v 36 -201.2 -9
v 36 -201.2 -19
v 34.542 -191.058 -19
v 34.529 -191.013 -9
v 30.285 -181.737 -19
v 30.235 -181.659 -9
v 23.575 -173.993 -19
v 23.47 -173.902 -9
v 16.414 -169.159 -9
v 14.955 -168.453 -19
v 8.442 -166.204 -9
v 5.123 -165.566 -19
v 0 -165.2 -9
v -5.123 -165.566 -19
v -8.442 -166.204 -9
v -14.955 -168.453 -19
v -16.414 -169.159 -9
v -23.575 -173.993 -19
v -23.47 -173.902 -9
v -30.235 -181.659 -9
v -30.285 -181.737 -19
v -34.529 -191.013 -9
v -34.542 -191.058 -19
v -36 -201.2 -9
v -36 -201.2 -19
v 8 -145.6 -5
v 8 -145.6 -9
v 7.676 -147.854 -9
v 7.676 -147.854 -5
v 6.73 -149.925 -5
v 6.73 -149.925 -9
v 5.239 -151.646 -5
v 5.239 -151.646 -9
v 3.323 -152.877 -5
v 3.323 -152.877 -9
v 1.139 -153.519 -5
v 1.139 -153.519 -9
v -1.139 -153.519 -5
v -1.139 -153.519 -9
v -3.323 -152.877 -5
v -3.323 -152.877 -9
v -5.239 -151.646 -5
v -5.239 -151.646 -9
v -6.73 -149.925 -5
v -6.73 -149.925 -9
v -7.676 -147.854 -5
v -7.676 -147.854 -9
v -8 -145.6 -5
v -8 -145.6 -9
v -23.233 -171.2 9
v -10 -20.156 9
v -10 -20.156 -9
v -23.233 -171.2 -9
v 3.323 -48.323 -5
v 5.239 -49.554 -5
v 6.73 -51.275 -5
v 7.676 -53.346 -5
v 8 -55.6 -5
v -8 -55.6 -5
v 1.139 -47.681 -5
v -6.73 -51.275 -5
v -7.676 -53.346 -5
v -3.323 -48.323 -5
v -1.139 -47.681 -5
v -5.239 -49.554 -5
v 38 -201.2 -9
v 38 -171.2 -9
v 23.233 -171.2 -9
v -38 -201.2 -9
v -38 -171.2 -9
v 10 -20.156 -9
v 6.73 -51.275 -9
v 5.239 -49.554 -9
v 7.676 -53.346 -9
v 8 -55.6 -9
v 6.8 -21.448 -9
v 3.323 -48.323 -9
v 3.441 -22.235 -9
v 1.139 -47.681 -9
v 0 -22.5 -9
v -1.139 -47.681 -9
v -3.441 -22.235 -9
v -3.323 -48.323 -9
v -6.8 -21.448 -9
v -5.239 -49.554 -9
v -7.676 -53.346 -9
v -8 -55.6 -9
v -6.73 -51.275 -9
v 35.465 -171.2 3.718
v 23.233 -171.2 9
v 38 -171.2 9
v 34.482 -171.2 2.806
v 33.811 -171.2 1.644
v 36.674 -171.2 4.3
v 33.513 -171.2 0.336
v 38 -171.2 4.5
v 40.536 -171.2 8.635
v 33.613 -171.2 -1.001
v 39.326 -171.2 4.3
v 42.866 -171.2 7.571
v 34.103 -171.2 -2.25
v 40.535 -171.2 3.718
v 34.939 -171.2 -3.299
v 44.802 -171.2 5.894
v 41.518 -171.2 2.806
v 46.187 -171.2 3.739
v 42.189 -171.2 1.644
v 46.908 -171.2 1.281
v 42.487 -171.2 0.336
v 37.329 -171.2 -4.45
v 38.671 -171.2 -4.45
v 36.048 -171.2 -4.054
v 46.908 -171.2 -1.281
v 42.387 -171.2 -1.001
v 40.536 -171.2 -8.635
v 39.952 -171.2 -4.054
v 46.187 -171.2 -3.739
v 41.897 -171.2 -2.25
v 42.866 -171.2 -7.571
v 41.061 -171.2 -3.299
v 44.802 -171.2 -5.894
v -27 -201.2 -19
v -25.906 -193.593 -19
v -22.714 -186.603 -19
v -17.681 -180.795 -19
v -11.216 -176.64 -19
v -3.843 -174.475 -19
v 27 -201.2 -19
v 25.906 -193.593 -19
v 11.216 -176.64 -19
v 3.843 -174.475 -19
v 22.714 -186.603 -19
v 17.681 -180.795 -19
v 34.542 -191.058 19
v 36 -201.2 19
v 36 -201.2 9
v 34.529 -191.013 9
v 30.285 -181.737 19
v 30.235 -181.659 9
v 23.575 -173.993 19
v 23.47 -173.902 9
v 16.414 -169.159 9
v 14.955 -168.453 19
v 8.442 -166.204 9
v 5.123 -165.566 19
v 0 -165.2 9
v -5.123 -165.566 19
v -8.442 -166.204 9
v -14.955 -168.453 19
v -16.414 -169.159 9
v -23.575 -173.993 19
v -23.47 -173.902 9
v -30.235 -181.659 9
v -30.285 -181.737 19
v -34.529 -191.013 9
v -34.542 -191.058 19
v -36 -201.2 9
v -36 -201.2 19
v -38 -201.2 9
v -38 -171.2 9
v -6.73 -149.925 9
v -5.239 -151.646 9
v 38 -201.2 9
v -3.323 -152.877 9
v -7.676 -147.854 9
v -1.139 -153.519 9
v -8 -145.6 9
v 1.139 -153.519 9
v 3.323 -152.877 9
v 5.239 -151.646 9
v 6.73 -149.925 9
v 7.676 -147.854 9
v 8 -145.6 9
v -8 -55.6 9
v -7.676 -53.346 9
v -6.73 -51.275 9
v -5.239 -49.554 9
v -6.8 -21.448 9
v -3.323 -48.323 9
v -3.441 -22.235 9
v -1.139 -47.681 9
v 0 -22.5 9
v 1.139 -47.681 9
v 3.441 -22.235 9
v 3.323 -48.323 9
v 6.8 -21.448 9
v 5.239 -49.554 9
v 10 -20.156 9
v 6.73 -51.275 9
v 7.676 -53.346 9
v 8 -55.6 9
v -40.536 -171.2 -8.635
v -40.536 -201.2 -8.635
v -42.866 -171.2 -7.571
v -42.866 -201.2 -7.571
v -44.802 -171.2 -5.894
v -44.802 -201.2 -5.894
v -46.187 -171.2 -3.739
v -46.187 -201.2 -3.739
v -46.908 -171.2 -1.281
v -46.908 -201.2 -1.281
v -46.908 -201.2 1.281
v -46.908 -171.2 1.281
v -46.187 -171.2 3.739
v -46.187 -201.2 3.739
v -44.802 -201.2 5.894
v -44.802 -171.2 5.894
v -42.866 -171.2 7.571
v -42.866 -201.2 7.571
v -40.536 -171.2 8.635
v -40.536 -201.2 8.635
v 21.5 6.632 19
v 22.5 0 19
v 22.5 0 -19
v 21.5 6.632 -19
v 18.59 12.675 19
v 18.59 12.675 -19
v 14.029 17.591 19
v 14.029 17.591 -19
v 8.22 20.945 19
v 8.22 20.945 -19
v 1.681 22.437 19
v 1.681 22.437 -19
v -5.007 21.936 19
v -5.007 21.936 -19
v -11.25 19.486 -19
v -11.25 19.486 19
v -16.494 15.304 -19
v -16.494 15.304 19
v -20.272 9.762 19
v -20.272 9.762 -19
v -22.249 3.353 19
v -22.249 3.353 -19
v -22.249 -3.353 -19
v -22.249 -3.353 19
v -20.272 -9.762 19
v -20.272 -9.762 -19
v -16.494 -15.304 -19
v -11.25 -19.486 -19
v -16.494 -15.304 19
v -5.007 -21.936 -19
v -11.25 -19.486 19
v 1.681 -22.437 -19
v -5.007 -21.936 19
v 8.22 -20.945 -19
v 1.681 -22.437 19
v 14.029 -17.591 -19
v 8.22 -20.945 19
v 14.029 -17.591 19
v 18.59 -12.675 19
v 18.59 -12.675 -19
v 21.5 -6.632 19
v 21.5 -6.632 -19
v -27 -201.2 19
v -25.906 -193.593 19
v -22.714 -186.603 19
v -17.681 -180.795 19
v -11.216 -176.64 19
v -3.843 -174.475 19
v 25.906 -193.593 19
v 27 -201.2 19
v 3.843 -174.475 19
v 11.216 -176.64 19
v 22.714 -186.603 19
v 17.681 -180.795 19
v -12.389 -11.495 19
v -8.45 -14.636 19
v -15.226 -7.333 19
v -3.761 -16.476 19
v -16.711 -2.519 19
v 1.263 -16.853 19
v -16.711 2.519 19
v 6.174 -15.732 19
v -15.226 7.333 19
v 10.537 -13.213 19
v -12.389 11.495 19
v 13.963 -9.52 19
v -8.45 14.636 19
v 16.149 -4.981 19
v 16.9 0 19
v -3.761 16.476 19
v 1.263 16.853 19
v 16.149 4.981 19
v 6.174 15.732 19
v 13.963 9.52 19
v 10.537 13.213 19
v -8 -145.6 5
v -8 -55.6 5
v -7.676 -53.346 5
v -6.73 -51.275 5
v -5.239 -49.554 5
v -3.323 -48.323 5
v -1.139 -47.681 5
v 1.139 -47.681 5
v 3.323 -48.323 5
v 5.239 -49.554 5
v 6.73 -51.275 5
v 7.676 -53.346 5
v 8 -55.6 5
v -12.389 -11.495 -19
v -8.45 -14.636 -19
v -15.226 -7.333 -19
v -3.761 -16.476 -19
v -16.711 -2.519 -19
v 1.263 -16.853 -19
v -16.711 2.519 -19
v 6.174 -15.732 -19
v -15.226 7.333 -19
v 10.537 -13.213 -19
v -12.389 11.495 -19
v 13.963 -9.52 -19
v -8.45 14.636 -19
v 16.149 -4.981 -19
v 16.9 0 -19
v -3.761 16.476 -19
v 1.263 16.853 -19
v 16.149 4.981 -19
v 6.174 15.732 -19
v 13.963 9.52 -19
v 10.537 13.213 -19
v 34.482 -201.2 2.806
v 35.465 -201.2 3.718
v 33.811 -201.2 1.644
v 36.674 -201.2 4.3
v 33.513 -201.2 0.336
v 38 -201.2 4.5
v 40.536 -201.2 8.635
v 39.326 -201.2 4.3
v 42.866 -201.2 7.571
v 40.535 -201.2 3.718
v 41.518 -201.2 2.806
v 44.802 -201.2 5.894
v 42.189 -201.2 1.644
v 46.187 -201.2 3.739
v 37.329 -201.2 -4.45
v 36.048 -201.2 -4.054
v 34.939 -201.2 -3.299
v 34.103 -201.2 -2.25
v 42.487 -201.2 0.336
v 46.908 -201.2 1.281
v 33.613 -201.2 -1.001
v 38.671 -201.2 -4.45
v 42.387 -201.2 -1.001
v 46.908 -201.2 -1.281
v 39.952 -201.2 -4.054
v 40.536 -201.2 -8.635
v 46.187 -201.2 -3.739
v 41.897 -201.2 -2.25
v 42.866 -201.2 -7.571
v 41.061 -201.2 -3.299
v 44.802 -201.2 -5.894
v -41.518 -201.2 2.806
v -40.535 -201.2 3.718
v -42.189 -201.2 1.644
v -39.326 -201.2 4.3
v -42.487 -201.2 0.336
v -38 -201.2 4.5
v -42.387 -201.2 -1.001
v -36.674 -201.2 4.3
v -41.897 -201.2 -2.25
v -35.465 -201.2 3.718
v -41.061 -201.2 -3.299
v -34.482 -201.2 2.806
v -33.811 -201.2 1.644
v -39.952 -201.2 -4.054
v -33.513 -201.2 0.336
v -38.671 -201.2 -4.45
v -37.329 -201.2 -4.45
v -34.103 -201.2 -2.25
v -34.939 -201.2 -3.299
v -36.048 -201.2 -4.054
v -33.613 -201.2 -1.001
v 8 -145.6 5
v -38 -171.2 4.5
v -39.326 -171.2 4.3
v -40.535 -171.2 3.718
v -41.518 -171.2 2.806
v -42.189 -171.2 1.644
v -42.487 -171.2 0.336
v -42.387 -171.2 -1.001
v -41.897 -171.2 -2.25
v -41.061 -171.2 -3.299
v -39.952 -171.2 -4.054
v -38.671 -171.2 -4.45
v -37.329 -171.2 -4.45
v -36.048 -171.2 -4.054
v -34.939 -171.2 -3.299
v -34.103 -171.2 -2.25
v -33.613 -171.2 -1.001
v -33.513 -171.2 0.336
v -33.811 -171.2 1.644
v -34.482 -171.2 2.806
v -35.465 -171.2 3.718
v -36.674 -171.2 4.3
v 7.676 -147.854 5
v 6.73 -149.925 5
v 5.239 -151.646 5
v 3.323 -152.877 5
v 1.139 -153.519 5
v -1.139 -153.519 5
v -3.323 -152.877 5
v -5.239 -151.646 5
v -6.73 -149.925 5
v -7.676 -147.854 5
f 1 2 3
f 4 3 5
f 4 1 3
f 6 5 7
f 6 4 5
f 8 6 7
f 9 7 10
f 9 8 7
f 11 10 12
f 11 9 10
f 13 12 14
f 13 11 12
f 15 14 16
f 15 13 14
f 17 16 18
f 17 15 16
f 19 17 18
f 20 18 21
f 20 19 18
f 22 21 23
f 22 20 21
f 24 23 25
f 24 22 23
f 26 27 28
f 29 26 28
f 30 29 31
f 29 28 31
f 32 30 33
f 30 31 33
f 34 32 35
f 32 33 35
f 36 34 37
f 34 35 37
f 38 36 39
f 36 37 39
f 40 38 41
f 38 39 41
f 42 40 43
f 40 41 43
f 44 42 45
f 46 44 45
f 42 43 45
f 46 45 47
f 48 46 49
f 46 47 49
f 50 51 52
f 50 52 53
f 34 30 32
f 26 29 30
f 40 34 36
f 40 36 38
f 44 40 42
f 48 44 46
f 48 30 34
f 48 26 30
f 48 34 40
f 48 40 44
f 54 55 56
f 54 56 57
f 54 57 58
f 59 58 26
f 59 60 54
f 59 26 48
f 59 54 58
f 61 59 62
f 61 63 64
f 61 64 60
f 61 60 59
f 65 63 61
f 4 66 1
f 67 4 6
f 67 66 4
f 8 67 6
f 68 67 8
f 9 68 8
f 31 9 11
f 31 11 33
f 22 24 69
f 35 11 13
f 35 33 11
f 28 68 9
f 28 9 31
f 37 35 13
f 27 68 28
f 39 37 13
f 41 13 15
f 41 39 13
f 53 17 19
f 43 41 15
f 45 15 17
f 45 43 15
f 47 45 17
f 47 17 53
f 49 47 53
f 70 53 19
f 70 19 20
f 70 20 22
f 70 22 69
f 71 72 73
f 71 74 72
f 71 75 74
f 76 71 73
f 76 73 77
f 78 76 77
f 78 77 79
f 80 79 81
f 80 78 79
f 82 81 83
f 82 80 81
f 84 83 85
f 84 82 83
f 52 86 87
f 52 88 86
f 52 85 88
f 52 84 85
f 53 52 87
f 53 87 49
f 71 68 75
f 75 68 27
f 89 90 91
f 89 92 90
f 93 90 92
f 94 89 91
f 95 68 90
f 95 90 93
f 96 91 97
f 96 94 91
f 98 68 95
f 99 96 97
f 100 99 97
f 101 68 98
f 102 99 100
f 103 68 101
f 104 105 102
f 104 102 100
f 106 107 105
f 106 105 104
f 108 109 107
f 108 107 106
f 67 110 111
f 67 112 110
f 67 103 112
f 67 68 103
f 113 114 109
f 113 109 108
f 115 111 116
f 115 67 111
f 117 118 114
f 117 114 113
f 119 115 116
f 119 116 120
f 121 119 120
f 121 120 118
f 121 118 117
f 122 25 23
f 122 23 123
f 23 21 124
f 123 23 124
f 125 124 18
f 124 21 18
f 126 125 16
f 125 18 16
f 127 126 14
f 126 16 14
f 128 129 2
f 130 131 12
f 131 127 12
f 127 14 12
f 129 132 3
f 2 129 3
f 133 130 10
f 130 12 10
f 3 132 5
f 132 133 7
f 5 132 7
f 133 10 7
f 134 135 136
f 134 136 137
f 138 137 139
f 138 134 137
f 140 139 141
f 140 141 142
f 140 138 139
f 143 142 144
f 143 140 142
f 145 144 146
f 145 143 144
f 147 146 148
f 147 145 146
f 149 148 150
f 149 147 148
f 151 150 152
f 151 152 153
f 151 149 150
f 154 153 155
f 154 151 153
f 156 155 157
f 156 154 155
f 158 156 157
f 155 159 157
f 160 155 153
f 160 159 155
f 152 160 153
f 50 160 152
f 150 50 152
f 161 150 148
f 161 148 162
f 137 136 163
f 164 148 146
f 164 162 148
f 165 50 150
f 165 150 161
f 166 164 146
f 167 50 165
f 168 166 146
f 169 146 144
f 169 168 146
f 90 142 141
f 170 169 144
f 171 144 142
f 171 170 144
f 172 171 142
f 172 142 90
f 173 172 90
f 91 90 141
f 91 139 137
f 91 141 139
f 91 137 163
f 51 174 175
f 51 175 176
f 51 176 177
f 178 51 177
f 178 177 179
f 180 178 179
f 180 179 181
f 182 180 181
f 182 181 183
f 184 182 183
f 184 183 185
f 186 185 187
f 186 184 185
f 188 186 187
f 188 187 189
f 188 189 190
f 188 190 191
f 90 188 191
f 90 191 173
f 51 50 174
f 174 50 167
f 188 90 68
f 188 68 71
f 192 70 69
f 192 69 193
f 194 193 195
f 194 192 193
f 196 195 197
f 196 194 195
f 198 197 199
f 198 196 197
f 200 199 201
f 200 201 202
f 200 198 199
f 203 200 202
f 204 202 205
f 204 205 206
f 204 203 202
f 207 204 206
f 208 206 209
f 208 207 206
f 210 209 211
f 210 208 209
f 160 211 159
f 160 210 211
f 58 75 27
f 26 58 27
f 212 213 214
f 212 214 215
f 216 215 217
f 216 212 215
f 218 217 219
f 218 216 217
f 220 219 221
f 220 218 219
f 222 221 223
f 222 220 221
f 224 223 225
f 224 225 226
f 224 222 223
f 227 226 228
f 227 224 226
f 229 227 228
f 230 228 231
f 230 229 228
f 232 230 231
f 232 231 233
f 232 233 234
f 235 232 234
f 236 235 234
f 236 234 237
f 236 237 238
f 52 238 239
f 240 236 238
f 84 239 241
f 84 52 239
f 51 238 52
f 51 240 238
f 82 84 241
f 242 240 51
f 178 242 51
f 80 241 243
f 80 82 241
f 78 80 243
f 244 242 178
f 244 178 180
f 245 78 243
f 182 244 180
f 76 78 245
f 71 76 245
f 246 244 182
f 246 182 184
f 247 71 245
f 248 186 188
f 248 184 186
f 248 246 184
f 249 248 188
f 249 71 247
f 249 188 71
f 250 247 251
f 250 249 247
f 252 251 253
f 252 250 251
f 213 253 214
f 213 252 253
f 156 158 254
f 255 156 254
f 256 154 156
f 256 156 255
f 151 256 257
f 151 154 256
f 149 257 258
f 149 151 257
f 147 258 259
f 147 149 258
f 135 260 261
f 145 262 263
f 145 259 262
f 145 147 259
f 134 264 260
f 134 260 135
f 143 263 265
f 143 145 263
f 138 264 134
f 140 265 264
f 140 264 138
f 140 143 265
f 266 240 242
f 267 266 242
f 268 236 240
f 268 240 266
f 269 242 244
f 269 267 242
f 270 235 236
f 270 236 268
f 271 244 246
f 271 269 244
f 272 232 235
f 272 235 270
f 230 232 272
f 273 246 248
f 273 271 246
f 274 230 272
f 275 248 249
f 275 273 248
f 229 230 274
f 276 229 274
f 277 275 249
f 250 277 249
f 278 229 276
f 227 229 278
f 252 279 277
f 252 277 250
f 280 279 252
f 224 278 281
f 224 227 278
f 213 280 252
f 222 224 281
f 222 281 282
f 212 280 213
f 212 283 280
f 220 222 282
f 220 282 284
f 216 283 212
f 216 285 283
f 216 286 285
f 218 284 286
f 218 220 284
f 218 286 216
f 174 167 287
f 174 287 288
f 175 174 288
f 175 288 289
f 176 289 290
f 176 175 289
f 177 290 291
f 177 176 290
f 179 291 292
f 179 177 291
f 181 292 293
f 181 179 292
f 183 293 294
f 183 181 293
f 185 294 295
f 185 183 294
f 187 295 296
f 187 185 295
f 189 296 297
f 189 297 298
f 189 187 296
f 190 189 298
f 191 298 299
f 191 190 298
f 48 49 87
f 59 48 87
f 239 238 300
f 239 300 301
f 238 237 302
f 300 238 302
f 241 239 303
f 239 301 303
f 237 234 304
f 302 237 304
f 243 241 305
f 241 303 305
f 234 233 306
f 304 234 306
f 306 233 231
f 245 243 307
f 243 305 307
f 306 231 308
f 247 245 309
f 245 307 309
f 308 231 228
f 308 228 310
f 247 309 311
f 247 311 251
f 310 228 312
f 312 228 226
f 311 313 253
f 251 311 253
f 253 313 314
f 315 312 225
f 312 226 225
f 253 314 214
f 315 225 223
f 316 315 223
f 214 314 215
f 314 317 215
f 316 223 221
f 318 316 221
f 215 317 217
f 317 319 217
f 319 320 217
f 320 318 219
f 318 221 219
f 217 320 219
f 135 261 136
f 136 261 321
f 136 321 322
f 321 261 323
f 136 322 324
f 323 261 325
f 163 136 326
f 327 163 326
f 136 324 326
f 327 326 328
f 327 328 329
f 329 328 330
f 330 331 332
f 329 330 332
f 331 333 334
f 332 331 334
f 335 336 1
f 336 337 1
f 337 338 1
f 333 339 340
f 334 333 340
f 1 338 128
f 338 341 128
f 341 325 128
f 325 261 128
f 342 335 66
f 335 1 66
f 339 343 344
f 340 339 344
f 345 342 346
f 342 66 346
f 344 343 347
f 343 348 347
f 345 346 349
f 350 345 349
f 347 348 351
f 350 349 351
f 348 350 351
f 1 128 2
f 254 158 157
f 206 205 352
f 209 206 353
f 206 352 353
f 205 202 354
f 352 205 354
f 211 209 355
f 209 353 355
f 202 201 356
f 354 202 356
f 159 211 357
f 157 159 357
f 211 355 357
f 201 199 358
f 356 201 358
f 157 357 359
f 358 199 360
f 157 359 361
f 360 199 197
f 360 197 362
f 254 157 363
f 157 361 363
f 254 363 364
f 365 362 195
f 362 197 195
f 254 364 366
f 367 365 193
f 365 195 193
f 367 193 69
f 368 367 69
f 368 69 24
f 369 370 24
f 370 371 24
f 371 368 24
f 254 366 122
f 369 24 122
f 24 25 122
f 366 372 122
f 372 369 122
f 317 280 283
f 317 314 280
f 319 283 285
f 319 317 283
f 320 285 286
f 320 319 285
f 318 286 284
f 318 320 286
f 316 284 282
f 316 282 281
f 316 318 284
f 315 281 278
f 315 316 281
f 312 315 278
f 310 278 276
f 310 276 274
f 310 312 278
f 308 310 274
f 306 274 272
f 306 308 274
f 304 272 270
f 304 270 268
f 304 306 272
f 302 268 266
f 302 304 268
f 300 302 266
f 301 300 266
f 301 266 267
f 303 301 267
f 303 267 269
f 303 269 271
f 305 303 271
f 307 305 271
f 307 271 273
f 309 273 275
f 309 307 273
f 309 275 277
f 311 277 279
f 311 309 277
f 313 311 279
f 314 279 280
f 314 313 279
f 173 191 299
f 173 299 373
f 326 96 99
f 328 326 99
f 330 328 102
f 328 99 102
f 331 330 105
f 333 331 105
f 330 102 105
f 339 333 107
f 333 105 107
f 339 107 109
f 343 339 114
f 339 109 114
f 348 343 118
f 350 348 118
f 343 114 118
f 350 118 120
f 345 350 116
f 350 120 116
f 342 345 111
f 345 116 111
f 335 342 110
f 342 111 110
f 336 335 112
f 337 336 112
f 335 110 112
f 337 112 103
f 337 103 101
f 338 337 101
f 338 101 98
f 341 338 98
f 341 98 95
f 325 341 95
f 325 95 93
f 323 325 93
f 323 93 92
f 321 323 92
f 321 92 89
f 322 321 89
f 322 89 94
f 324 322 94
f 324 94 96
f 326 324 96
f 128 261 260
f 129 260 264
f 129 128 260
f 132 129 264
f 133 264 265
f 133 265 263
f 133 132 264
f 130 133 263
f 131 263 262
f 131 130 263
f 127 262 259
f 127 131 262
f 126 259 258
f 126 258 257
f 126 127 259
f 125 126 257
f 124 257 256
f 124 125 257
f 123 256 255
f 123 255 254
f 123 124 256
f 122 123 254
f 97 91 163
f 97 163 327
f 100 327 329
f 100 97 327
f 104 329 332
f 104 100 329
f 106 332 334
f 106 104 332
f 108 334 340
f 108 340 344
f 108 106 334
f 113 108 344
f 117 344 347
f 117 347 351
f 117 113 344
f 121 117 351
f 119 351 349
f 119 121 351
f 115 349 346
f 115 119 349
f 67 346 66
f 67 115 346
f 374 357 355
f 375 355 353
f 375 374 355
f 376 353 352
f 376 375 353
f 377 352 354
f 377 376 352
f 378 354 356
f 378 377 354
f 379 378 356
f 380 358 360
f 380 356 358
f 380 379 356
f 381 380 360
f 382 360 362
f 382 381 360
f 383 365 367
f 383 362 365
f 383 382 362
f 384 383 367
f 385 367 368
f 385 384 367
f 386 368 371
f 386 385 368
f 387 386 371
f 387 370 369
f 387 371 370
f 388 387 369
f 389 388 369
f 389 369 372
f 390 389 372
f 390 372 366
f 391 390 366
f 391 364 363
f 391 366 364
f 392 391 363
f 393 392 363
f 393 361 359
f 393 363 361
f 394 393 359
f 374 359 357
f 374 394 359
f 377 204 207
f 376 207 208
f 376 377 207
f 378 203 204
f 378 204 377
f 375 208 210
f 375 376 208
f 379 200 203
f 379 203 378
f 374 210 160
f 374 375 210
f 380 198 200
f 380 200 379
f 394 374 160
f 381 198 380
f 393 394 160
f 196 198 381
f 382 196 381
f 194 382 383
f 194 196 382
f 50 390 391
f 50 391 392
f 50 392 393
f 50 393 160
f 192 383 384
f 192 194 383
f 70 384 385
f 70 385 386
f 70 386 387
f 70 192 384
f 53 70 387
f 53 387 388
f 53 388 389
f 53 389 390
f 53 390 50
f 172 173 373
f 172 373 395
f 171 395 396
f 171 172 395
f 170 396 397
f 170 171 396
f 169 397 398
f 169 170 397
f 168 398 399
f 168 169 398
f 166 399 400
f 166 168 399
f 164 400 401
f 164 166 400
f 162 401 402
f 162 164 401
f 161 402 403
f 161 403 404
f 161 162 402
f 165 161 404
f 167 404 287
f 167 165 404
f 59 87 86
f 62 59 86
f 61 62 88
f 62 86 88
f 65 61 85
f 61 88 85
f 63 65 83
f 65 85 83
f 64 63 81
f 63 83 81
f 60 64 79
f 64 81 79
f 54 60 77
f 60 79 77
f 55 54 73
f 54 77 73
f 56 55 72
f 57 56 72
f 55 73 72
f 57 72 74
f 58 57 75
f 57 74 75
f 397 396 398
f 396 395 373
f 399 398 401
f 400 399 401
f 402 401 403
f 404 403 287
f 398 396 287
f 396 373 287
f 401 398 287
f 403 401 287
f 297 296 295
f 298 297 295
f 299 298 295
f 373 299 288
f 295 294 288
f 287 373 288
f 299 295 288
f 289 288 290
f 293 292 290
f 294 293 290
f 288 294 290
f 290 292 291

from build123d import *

# Parameters (mm, degrees)
SKETCH2_R             = 22.5
SKETCH2_R_2           = 16.9
BOSS_EXTRUDE1_DEPTH   = 19
SKETCH2_R_3           = 36
SKETCH2_R_4           = 27
BOSS_EXTRUDE1_2_DEPTH = 19
BOSS_EXTRUDE2_DEPTH   = 9
CUT_EXTRUDE1_DEPTH    = 4
CUT_EXTRUDE2_DEPTH    = 99
BOSS_EXTRUDE3_DEPTH   = 30
CUT_EXTRUDE3_START    = -99
SKETCH6_R             = 27
CUT_EXTRUDE3_DEPTH    = 99
SKETCH7_R             = 4.5
CUT_EXTRUDE4_DEPTH    = 99


with BuildPart() as part:
    # Sketch2 → Boss-Extrude1 (new, symmetric)
    with BuildSketch(Plane.XY):
        Circle(SKETCH2_R)
        Circle(SKETCH2_R_2, mode=Mode.SUBTRACT)
    extrude(amount=BOSS_EXTRUDE1_DEPTH, both=True)



with BuildPart() as body_2:
    # Sketch2 → Boss-Extrude1 2 (new, symmetric)
    with BuildSketch(Plane.XY):
        with Locations((0, -201.2)):
            Circle(SKETCH2_R_3)
        with Locations((0, -201.2)):
            Circle(SKETCH2_R_4, mode=Mode.SUBTRACT)
    extrude(amount=BOSS_EXTRUDE1_2_DEPTH, both=True)


with BuildPart() as part_1:
    add(part.part)

    add(body_2.part)  # Boss-Extrude2 merges body 2
    # Sketch2<5> → Boss-Extrude2 (add, symmetric)
    with BuildSketch(Plane.XY):
        with BuildLine():
            Line((0, -165.2), (0, -22.5))
            ThreePointArc((0, -22.5), (-5.135562367, -21.906072199), (-10, -20.155644371))
            Line((-10, -20.155644371), (-23.469590176, -173.902045187))
            ThreePointArc((-23.469590176, -173.902045187), (-12.515462971, -167.445545677), (0, -165.2))
        make_face()
        with BuildLine():
            ThreePointArc((10, -20.155644371), (5.135562367, -21.906072199), (0, -22.5))
            Line((0, -22.5), (0, -165.2))
            ThreePointArc((0, -165.2), (12.515462971, -167.445545677), (23.469590176, -173.902045187))
            Line((23.469590176, -173.902045187), (10, -20.155644371))
        make_face()
    extrude(amount=BOSS_EXTRUDE2_DEPTH, both=True)

    # Sketch3 → Cut-Extrude1 (cut)
    with BuildSketch(Plane.XY.offset(9)):
        with BuildLine():
            Line((8, -55.6), (8, -145.6))
            ThreePointArc((8, -145.6), (0, -153.6), (-8, -145.6))
            Line((-8, -145.6), (-8, -55.6))
            ThreePointArc((-8, -55.6), (0, -47.6), (8, -55.6))
        make_face()
    cut_extrude1 = extrude(amount=-CUT_EXTRUDE1_DEPTH, mode=Mode.SUBTRACT)

    # Mirror1: Cut-Extrude1 across plane
    add(cut_extrude1.mirror(Plane.XY), mode=Mode.SUBTRACT)

    # Sketch4 → Cut-Extrude2 (cut)
    with BuildSketch(Plane.XY.offset(19)):
        Polygon((0, -201.2), (-54.705364776, -201.2), (-51.550648926, -248.976612299), (37.861738866, -255.19137468), (50.544643276, -201.2), align=None)
    extrude(amount=-CUT_EXTRUDE2_DEPTH, mode=Mode.SUBTRACT)

    # Sketch5 → Boss-Extrude3 (add)
    with BuildSketch(Plane(origin=(0, -171.2, 0), x_dir=(-1, 0, 0), z_dir=(0, -1, 0))):
        with BuildLine():
            Line((38, -9), (-38, -9))
            ThreePointArc((-38, -9), (-47, 0), (-38, 9))
            Line((-38, 9), (38, 9))
            ThreePointArc((38, 9), (47, 0), (38, -9))
        make_face()
    extrude(amount=BOSS_EXTRUDE3_DEPTH)

    # Sketch6 → Cut-Extrude3 (cut)
    with BuildSketch(Plane.XY.offset(9).offset(CUT_EXTRUDE3_START)):
        with Locations((0, -201.2)):
            Circle(SKETCH6_R)
    extrude(amount=CUT_EXTRUDE3_DEPTH, mode=Mode.SUBTRACT)

    # Sketch7 → Cut-Extrude4 (cut)
    with BuildSketch(Plane(origin=(0, -171.2, 0), x_dir=(1, 0, 0), z_dir=(0, 1, 0))):
        with Locations(Location((38, 0, 0), (0, 0, 270))):
            Circle(SKETCH7_R)
    cut_extrude4 = extrude(amount=-CUT_EXTRUDE4_DEPTH, mode=Mode.SUBTRACT)

    # Mirror2: Cut-Extrude4 across plane
    add(cut_extrude4.mirror(Plane(origin=(0, 0, 0), x_dir=(0, 0, 1), z_dir=(1, 0, 0))), mode=Mode.SUBTRACT)


solid = part_1.part
